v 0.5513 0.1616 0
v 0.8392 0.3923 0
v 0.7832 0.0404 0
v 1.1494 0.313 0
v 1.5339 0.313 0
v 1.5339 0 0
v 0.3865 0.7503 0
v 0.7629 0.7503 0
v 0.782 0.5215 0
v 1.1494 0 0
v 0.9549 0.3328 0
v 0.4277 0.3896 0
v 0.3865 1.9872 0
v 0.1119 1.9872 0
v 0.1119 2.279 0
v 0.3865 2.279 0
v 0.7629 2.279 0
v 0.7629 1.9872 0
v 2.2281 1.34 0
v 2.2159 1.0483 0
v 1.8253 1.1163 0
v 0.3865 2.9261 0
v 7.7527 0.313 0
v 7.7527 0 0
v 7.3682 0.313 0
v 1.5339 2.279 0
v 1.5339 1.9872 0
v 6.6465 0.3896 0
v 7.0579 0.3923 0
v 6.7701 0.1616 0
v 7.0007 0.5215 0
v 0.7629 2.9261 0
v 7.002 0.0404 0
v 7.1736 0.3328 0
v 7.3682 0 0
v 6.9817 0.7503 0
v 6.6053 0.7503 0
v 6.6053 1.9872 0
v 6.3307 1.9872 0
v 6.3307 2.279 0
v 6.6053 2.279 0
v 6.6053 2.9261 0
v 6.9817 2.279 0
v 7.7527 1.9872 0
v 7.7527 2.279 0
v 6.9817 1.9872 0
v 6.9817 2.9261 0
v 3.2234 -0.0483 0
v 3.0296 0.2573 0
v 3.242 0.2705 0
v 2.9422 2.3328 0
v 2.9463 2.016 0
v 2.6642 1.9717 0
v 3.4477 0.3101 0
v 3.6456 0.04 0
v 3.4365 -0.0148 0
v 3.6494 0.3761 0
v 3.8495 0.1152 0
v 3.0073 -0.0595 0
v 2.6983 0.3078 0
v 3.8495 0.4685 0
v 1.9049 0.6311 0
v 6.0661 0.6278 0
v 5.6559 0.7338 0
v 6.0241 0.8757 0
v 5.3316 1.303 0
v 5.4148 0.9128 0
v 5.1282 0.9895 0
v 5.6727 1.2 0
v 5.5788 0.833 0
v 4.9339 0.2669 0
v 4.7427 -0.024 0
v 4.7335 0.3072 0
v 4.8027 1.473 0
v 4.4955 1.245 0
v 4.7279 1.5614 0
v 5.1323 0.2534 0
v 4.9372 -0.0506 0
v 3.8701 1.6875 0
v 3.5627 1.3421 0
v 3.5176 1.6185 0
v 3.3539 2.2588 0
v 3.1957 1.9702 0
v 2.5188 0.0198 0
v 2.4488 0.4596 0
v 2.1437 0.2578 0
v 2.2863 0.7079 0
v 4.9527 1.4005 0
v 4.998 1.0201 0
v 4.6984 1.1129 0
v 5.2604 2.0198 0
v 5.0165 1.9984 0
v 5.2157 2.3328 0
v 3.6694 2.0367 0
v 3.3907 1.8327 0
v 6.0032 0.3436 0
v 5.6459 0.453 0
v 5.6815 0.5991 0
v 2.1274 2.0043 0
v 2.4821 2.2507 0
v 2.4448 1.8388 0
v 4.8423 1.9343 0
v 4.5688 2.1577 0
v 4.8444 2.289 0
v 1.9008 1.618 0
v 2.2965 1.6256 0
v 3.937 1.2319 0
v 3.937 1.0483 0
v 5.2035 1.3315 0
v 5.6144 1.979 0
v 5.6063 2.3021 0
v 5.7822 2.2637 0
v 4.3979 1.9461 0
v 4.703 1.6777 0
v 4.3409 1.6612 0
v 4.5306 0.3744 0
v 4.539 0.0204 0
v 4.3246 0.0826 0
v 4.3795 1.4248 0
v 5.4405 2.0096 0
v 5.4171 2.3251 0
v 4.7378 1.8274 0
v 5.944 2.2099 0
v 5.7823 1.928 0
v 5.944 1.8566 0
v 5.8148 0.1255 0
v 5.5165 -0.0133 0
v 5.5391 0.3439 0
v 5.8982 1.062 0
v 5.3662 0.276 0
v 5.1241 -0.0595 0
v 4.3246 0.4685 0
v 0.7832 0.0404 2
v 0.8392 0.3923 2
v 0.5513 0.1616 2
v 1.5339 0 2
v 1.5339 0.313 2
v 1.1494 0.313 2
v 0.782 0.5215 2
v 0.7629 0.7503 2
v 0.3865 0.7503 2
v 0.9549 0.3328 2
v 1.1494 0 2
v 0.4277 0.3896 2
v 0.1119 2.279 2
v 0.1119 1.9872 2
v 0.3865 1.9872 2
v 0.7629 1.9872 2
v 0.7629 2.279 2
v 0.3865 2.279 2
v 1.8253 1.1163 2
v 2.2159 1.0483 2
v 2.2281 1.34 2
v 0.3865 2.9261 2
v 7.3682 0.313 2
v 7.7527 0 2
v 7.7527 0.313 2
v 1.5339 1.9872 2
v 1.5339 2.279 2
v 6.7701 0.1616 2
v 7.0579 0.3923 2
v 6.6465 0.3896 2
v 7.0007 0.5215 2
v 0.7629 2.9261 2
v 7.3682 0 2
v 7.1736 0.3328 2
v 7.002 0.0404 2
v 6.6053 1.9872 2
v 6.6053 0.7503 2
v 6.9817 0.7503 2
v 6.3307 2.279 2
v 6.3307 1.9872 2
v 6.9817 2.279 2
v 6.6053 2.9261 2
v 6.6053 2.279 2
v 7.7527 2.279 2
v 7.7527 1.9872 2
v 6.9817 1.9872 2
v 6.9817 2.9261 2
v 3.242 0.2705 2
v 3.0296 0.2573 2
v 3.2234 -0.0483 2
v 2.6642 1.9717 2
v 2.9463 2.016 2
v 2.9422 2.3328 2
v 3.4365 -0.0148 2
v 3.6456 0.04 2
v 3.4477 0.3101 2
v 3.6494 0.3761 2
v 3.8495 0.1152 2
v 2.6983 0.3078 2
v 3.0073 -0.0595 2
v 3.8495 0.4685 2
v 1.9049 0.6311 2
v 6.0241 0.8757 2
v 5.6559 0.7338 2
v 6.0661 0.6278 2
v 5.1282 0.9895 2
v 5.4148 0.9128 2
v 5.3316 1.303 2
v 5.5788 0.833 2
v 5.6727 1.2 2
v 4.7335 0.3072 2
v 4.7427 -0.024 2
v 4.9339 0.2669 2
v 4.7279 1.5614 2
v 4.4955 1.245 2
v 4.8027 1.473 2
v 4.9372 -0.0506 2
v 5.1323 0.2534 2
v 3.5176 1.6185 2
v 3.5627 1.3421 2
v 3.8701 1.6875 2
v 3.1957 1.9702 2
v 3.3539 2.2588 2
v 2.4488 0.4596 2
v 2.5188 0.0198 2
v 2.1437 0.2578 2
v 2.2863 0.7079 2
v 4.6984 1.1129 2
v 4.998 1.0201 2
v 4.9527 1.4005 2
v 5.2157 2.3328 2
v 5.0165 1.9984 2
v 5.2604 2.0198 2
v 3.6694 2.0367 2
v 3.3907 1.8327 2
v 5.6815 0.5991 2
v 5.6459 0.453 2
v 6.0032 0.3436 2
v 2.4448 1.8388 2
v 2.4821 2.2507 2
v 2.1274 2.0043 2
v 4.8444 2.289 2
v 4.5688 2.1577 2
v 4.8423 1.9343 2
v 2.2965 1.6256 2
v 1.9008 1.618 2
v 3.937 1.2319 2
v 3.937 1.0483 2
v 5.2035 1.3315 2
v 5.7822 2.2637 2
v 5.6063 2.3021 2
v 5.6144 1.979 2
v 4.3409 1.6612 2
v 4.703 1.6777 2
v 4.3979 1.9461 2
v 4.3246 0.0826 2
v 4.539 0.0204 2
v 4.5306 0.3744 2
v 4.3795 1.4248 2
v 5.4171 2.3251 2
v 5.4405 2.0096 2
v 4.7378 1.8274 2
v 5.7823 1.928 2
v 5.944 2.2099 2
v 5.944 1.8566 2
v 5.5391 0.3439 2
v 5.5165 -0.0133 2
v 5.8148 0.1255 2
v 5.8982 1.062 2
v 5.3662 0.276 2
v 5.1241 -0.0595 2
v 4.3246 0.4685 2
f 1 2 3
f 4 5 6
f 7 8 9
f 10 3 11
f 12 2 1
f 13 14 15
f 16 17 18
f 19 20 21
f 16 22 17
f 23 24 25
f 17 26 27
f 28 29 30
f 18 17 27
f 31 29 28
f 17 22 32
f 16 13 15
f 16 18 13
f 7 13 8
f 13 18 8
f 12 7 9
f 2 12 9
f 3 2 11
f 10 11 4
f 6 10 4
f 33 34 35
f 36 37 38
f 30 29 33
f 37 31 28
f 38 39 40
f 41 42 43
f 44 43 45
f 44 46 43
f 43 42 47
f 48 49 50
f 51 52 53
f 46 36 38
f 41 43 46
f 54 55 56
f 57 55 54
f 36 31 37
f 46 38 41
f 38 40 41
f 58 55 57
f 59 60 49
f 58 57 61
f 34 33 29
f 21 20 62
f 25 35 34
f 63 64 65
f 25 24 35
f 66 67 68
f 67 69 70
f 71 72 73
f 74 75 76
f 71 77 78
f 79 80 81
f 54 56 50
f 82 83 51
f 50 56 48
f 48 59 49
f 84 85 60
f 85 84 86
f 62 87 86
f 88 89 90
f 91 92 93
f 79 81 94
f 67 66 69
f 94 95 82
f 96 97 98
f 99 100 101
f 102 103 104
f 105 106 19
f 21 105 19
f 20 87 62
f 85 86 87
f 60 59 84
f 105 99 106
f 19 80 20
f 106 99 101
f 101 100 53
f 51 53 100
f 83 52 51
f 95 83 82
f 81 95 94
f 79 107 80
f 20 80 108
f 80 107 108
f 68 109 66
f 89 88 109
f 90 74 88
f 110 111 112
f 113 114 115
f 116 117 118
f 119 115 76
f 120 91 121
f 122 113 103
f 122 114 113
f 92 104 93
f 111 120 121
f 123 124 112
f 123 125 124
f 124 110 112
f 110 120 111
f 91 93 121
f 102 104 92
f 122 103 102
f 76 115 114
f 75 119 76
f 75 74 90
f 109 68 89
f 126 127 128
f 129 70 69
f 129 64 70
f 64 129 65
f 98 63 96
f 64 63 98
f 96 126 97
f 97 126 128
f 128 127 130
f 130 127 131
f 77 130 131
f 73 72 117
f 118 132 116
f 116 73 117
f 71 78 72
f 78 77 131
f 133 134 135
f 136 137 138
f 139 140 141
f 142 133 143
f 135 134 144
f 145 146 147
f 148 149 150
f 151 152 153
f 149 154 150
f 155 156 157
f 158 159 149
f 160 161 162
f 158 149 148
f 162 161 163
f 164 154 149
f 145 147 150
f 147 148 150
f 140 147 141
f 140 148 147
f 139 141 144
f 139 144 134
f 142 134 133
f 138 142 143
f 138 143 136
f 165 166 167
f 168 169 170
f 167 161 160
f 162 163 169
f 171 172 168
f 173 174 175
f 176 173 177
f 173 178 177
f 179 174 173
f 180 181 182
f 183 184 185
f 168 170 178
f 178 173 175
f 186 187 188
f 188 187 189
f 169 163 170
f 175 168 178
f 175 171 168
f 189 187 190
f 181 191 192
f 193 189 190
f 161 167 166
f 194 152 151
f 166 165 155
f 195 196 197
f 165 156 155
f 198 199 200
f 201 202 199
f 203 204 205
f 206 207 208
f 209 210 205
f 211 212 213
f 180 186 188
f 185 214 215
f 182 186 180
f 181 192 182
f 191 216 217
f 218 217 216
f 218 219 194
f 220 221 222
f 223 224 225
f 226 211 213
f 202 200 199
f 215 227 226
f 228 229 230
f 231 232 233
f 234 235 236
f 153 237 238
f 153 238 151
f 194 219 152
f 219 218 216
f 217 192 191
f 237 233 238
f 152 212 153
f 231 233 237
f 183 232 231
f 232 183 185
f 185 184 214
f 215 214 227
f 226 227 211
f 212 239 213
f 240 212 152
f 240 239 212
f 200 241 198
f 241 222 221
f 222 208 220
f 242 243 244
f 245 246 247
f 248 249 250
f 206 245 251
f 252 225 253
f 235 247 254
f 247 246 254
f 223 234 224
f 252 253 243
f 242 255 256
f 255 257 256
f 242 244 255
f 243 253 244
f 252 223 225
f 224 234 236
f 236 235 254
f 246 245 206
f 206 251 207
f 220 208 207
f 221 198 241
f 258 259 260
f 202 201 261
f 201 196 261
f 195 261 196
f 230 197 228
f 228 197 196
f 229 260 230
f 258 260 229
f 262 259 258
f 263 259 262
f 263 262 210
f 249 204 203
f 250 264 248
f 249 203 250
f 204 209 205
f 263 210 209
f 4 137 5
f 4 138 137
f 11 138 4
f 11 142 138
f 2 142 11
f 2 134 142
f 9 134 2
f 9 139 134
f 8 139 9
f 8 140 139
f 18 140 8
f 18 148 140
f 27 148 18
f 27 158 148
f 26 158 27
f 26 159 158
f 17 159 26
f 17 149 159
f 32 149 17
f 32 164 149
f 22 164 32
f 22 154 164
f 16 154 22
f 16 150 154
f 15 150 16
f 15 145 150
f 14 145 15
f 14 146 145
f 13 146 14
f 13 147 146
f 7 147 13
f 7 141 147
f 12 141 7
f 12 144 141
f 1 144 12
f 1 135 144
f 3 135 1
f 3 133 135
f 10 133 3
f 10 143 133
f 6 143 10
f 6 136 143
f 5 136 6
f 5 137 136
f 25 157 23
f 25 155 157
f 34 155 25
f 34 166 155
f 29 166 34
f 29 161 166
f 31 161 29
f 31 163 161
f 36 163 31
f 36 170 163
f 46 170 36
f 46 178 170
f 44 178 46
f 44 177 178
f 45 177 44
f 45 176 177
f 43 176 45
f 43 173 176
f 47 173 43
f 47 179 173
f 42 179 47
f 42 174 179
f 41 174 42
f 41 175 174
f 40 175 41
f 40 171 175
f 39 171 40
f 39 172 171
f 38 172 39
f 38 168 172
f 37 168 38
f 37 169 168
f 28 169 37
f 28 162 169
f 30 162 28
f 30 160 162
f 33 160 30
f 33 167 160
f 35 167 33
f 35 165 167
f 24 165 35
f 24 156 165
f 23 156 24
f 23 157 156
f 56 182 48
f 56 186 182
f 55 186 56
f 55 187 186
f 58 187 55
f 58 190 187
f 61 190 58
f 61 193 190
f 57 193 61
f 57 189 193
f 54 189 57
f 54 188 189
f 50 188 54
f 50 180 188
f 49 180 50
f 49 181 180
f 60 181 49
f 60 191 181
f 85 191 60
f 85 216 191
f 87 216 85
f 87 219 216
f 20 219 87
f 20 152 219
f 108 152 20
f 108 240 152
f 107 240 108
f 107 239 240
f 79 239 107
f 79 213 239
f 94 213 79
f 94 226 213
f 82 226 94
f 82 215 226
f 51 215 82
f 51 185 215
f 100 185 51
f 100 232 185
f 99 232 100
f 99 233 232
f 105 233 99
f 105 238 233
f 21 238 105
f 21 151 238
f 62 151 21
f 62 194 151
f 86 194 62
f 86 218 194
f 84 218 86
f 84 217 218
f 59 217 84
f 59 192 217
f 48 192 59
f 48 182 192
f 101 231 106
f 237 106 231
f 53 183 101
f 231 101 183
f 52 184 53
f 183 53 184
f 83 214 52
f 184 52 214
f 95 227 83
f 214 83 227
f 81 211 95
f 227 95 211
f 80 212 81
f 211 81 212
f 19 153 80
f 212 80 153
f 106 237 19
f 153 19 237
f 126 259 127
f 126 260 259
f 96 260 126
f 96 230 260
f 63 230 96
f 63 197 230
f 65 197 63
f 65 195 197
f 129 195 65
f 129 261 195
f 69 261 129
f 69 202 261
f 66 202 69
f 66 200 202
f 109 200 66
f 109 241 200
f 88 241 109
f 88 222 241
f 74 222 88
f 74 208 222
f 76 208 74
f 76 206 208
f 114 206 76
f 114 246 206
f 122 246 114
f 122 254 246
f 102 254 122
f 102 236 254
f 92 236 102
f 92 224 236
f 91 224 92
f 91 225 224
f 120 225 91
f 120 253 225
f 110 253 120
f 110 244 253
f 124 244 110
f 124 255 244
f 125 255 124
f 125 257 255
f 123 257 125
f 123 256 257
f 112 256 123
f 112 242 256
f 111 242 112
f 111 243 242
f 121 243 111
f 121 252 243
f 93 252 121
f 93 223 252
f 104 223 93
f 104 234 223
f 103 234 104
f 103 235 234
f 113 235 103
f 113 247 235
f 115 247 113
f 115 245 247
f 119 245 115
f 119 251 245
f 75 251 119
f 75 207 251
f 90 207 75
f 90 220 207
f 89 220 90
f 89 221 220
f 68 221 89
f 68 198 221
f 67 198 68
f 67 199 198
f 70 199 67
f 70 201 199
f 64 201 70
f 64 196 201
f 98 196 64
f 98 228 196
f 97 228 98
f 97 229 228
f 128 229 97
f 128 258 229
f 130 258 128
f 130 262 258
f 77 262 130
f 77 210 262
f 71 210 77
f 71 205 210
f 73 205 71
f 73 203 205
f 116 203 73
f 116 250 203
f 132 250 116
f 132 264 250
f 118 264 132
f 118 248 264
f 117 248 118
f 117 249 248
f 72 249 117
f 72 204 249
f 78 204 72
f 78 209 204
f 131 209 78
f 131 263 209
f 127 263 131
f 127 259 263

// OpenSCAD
texte_a_inserer = "test"; 
taille = 3; 
police = "DejaVuSans"; //[[Abril Fatface,Aclonica,Acme,Advent Pro,Akronim,Aladin,Alegreya,Alegreya Sans,Alegreya SC,Alex Brush,Alfa Slab One,Alice,Amaranth,Architects Daughter,Archivo Black,Archivo Narrow,Arimo,Arvo,Asap,Astloch,Asul,Averia Libre,Averia Serif Libre,Bangers,Basic,Belgrano,Berkshire Swash,Bigshot One,Bilbo Swash Caps,Black Ops One,Bonbon,Bowlby One SC,Brawler,Bubblegum Sans,Butterfly Kids,Cabin Condensed,Caesar Dressing,Cagliostro,Calligraffitti,Capriola,Carter One,Changa One,Chango,Chelsea Market,Cherry Cream Soda,Chewy,Chicle,Chivo,Clicker Script,Coming Soon,Concert One,Condiment,Cookie,Courgette,Covered By Your Grace,Crimson Text,Dancing Script,DejaVu Sans,DejaVu Serif,Dhurjati,Doppio One,Dosis,Droid Sans,Eagle Lake,Electrolize,Emilys Candy,Encode Sans,Encode Sans Compressed,Euphoria Script,Exo,Exo 2,Faster One,Federo,Finger Paint,Fjord One,Fontdiner Swanky,Freckle Face,Fruktur,Gabriela,Geo,Germania One,Give You Glory,Gloria Hallelujah,Goudy Bookletter 1911,Graduate,Grand Hotel,Great Vibes,Griffy,Hanalei Fill,Happy Monkey,Henny Penny,Hind,IM Fell English SC,Indie Flower,Irish Grover,Italianno,Jacques Francois Shadow,Jolly Lodger,Josefin Slab,Joti One,Judson,Just Another Hand,Kalam,Kameron,Karma,Kavoon,Knewave,Kranky,Kristi,Laila,Lakki Reddy,Lancelot,Lato,Leckerli One,Ledger,Lekton,Lemon One,Liberation Sans,Libre Caslon Text,Life Savers,Lilita One,Lily Script One,Limelight,Lobster,Lobster Two,Londrina Outline,Londrina Shadow,Londrina Solid,Lora,Love Ya Like A Sister,Loved by the King,Lovers Quarrel,Luckiest Guy,Lusitana,Macondo,Macondo Swash Caps,Mako,Marck Script,Margarine,Marko One,Maven Pro,McLaren,MedievalSharp,Merienda One,Merriweather,Mervale Script,Metal Mania,Metrophobic,Milonga,Miltonian Tattoo,Miss Fajardose,Molle,Montez,Montserrat,Mr De Haviland,Mystery Quest,Neucha,New Rocker,Niconne,Nosifer,Nothing You Could Do,Noto Sans Oriya,Noto Serif,Nova Square,Nunito,Old Standard TT,Oleo Script,Oleo Script Swash Caps,Orbitron,Oregano,Orienta,Original Surfer,Oswald,Over the Rainbow,Overlock,Oxygen,Pacifico,Paprika,Parisienne,Patrick Hand SC,Paytone One,Peralta,Permanent Marker,Piedra,Pirata One,Play,Playball,Poetsen One,Poppins,Press Start 2P,Princess Sofia,PT Mono,Qwigley,Racing Sans One,Raleway,Rancho,Ranga,Ribeye,Roboto,Roboto Condensed,Roboto Slab,Rochester,Rock Salt,Rubik One,Sail,Salsa,Sansita One,Sarina,Satisfy,Schoolbell,Seaweed Script,Sevillana,Shadows Into Light,Shadows Into Light Two,Share,Six Caps,Skranji,Source Sans Pro,Spicy Rice,Stardos Stencil,Stoke,Syncopate,Teko,Terminal Dosis,The Girl Next Door,Tillana,Timmana,Titillium Web,Ubuntu,Ultra,Underdog,UnifrakturCook,UnifrakturMaguntia,Vampiro One,Vidaloka,Viga,Voces,Volkhov,Vollkorn,Voltaire,Waiting for the Sunrise,Wallpoet,Wellfleet,Wendy One,Yellowtail,Yesteryear,Zeyada]]
hauteur = 2; 
module rendu(){
linear_extrude(hauteur) text(texte_a_inserer,size = taille, font = police);
}
rendu();
 
